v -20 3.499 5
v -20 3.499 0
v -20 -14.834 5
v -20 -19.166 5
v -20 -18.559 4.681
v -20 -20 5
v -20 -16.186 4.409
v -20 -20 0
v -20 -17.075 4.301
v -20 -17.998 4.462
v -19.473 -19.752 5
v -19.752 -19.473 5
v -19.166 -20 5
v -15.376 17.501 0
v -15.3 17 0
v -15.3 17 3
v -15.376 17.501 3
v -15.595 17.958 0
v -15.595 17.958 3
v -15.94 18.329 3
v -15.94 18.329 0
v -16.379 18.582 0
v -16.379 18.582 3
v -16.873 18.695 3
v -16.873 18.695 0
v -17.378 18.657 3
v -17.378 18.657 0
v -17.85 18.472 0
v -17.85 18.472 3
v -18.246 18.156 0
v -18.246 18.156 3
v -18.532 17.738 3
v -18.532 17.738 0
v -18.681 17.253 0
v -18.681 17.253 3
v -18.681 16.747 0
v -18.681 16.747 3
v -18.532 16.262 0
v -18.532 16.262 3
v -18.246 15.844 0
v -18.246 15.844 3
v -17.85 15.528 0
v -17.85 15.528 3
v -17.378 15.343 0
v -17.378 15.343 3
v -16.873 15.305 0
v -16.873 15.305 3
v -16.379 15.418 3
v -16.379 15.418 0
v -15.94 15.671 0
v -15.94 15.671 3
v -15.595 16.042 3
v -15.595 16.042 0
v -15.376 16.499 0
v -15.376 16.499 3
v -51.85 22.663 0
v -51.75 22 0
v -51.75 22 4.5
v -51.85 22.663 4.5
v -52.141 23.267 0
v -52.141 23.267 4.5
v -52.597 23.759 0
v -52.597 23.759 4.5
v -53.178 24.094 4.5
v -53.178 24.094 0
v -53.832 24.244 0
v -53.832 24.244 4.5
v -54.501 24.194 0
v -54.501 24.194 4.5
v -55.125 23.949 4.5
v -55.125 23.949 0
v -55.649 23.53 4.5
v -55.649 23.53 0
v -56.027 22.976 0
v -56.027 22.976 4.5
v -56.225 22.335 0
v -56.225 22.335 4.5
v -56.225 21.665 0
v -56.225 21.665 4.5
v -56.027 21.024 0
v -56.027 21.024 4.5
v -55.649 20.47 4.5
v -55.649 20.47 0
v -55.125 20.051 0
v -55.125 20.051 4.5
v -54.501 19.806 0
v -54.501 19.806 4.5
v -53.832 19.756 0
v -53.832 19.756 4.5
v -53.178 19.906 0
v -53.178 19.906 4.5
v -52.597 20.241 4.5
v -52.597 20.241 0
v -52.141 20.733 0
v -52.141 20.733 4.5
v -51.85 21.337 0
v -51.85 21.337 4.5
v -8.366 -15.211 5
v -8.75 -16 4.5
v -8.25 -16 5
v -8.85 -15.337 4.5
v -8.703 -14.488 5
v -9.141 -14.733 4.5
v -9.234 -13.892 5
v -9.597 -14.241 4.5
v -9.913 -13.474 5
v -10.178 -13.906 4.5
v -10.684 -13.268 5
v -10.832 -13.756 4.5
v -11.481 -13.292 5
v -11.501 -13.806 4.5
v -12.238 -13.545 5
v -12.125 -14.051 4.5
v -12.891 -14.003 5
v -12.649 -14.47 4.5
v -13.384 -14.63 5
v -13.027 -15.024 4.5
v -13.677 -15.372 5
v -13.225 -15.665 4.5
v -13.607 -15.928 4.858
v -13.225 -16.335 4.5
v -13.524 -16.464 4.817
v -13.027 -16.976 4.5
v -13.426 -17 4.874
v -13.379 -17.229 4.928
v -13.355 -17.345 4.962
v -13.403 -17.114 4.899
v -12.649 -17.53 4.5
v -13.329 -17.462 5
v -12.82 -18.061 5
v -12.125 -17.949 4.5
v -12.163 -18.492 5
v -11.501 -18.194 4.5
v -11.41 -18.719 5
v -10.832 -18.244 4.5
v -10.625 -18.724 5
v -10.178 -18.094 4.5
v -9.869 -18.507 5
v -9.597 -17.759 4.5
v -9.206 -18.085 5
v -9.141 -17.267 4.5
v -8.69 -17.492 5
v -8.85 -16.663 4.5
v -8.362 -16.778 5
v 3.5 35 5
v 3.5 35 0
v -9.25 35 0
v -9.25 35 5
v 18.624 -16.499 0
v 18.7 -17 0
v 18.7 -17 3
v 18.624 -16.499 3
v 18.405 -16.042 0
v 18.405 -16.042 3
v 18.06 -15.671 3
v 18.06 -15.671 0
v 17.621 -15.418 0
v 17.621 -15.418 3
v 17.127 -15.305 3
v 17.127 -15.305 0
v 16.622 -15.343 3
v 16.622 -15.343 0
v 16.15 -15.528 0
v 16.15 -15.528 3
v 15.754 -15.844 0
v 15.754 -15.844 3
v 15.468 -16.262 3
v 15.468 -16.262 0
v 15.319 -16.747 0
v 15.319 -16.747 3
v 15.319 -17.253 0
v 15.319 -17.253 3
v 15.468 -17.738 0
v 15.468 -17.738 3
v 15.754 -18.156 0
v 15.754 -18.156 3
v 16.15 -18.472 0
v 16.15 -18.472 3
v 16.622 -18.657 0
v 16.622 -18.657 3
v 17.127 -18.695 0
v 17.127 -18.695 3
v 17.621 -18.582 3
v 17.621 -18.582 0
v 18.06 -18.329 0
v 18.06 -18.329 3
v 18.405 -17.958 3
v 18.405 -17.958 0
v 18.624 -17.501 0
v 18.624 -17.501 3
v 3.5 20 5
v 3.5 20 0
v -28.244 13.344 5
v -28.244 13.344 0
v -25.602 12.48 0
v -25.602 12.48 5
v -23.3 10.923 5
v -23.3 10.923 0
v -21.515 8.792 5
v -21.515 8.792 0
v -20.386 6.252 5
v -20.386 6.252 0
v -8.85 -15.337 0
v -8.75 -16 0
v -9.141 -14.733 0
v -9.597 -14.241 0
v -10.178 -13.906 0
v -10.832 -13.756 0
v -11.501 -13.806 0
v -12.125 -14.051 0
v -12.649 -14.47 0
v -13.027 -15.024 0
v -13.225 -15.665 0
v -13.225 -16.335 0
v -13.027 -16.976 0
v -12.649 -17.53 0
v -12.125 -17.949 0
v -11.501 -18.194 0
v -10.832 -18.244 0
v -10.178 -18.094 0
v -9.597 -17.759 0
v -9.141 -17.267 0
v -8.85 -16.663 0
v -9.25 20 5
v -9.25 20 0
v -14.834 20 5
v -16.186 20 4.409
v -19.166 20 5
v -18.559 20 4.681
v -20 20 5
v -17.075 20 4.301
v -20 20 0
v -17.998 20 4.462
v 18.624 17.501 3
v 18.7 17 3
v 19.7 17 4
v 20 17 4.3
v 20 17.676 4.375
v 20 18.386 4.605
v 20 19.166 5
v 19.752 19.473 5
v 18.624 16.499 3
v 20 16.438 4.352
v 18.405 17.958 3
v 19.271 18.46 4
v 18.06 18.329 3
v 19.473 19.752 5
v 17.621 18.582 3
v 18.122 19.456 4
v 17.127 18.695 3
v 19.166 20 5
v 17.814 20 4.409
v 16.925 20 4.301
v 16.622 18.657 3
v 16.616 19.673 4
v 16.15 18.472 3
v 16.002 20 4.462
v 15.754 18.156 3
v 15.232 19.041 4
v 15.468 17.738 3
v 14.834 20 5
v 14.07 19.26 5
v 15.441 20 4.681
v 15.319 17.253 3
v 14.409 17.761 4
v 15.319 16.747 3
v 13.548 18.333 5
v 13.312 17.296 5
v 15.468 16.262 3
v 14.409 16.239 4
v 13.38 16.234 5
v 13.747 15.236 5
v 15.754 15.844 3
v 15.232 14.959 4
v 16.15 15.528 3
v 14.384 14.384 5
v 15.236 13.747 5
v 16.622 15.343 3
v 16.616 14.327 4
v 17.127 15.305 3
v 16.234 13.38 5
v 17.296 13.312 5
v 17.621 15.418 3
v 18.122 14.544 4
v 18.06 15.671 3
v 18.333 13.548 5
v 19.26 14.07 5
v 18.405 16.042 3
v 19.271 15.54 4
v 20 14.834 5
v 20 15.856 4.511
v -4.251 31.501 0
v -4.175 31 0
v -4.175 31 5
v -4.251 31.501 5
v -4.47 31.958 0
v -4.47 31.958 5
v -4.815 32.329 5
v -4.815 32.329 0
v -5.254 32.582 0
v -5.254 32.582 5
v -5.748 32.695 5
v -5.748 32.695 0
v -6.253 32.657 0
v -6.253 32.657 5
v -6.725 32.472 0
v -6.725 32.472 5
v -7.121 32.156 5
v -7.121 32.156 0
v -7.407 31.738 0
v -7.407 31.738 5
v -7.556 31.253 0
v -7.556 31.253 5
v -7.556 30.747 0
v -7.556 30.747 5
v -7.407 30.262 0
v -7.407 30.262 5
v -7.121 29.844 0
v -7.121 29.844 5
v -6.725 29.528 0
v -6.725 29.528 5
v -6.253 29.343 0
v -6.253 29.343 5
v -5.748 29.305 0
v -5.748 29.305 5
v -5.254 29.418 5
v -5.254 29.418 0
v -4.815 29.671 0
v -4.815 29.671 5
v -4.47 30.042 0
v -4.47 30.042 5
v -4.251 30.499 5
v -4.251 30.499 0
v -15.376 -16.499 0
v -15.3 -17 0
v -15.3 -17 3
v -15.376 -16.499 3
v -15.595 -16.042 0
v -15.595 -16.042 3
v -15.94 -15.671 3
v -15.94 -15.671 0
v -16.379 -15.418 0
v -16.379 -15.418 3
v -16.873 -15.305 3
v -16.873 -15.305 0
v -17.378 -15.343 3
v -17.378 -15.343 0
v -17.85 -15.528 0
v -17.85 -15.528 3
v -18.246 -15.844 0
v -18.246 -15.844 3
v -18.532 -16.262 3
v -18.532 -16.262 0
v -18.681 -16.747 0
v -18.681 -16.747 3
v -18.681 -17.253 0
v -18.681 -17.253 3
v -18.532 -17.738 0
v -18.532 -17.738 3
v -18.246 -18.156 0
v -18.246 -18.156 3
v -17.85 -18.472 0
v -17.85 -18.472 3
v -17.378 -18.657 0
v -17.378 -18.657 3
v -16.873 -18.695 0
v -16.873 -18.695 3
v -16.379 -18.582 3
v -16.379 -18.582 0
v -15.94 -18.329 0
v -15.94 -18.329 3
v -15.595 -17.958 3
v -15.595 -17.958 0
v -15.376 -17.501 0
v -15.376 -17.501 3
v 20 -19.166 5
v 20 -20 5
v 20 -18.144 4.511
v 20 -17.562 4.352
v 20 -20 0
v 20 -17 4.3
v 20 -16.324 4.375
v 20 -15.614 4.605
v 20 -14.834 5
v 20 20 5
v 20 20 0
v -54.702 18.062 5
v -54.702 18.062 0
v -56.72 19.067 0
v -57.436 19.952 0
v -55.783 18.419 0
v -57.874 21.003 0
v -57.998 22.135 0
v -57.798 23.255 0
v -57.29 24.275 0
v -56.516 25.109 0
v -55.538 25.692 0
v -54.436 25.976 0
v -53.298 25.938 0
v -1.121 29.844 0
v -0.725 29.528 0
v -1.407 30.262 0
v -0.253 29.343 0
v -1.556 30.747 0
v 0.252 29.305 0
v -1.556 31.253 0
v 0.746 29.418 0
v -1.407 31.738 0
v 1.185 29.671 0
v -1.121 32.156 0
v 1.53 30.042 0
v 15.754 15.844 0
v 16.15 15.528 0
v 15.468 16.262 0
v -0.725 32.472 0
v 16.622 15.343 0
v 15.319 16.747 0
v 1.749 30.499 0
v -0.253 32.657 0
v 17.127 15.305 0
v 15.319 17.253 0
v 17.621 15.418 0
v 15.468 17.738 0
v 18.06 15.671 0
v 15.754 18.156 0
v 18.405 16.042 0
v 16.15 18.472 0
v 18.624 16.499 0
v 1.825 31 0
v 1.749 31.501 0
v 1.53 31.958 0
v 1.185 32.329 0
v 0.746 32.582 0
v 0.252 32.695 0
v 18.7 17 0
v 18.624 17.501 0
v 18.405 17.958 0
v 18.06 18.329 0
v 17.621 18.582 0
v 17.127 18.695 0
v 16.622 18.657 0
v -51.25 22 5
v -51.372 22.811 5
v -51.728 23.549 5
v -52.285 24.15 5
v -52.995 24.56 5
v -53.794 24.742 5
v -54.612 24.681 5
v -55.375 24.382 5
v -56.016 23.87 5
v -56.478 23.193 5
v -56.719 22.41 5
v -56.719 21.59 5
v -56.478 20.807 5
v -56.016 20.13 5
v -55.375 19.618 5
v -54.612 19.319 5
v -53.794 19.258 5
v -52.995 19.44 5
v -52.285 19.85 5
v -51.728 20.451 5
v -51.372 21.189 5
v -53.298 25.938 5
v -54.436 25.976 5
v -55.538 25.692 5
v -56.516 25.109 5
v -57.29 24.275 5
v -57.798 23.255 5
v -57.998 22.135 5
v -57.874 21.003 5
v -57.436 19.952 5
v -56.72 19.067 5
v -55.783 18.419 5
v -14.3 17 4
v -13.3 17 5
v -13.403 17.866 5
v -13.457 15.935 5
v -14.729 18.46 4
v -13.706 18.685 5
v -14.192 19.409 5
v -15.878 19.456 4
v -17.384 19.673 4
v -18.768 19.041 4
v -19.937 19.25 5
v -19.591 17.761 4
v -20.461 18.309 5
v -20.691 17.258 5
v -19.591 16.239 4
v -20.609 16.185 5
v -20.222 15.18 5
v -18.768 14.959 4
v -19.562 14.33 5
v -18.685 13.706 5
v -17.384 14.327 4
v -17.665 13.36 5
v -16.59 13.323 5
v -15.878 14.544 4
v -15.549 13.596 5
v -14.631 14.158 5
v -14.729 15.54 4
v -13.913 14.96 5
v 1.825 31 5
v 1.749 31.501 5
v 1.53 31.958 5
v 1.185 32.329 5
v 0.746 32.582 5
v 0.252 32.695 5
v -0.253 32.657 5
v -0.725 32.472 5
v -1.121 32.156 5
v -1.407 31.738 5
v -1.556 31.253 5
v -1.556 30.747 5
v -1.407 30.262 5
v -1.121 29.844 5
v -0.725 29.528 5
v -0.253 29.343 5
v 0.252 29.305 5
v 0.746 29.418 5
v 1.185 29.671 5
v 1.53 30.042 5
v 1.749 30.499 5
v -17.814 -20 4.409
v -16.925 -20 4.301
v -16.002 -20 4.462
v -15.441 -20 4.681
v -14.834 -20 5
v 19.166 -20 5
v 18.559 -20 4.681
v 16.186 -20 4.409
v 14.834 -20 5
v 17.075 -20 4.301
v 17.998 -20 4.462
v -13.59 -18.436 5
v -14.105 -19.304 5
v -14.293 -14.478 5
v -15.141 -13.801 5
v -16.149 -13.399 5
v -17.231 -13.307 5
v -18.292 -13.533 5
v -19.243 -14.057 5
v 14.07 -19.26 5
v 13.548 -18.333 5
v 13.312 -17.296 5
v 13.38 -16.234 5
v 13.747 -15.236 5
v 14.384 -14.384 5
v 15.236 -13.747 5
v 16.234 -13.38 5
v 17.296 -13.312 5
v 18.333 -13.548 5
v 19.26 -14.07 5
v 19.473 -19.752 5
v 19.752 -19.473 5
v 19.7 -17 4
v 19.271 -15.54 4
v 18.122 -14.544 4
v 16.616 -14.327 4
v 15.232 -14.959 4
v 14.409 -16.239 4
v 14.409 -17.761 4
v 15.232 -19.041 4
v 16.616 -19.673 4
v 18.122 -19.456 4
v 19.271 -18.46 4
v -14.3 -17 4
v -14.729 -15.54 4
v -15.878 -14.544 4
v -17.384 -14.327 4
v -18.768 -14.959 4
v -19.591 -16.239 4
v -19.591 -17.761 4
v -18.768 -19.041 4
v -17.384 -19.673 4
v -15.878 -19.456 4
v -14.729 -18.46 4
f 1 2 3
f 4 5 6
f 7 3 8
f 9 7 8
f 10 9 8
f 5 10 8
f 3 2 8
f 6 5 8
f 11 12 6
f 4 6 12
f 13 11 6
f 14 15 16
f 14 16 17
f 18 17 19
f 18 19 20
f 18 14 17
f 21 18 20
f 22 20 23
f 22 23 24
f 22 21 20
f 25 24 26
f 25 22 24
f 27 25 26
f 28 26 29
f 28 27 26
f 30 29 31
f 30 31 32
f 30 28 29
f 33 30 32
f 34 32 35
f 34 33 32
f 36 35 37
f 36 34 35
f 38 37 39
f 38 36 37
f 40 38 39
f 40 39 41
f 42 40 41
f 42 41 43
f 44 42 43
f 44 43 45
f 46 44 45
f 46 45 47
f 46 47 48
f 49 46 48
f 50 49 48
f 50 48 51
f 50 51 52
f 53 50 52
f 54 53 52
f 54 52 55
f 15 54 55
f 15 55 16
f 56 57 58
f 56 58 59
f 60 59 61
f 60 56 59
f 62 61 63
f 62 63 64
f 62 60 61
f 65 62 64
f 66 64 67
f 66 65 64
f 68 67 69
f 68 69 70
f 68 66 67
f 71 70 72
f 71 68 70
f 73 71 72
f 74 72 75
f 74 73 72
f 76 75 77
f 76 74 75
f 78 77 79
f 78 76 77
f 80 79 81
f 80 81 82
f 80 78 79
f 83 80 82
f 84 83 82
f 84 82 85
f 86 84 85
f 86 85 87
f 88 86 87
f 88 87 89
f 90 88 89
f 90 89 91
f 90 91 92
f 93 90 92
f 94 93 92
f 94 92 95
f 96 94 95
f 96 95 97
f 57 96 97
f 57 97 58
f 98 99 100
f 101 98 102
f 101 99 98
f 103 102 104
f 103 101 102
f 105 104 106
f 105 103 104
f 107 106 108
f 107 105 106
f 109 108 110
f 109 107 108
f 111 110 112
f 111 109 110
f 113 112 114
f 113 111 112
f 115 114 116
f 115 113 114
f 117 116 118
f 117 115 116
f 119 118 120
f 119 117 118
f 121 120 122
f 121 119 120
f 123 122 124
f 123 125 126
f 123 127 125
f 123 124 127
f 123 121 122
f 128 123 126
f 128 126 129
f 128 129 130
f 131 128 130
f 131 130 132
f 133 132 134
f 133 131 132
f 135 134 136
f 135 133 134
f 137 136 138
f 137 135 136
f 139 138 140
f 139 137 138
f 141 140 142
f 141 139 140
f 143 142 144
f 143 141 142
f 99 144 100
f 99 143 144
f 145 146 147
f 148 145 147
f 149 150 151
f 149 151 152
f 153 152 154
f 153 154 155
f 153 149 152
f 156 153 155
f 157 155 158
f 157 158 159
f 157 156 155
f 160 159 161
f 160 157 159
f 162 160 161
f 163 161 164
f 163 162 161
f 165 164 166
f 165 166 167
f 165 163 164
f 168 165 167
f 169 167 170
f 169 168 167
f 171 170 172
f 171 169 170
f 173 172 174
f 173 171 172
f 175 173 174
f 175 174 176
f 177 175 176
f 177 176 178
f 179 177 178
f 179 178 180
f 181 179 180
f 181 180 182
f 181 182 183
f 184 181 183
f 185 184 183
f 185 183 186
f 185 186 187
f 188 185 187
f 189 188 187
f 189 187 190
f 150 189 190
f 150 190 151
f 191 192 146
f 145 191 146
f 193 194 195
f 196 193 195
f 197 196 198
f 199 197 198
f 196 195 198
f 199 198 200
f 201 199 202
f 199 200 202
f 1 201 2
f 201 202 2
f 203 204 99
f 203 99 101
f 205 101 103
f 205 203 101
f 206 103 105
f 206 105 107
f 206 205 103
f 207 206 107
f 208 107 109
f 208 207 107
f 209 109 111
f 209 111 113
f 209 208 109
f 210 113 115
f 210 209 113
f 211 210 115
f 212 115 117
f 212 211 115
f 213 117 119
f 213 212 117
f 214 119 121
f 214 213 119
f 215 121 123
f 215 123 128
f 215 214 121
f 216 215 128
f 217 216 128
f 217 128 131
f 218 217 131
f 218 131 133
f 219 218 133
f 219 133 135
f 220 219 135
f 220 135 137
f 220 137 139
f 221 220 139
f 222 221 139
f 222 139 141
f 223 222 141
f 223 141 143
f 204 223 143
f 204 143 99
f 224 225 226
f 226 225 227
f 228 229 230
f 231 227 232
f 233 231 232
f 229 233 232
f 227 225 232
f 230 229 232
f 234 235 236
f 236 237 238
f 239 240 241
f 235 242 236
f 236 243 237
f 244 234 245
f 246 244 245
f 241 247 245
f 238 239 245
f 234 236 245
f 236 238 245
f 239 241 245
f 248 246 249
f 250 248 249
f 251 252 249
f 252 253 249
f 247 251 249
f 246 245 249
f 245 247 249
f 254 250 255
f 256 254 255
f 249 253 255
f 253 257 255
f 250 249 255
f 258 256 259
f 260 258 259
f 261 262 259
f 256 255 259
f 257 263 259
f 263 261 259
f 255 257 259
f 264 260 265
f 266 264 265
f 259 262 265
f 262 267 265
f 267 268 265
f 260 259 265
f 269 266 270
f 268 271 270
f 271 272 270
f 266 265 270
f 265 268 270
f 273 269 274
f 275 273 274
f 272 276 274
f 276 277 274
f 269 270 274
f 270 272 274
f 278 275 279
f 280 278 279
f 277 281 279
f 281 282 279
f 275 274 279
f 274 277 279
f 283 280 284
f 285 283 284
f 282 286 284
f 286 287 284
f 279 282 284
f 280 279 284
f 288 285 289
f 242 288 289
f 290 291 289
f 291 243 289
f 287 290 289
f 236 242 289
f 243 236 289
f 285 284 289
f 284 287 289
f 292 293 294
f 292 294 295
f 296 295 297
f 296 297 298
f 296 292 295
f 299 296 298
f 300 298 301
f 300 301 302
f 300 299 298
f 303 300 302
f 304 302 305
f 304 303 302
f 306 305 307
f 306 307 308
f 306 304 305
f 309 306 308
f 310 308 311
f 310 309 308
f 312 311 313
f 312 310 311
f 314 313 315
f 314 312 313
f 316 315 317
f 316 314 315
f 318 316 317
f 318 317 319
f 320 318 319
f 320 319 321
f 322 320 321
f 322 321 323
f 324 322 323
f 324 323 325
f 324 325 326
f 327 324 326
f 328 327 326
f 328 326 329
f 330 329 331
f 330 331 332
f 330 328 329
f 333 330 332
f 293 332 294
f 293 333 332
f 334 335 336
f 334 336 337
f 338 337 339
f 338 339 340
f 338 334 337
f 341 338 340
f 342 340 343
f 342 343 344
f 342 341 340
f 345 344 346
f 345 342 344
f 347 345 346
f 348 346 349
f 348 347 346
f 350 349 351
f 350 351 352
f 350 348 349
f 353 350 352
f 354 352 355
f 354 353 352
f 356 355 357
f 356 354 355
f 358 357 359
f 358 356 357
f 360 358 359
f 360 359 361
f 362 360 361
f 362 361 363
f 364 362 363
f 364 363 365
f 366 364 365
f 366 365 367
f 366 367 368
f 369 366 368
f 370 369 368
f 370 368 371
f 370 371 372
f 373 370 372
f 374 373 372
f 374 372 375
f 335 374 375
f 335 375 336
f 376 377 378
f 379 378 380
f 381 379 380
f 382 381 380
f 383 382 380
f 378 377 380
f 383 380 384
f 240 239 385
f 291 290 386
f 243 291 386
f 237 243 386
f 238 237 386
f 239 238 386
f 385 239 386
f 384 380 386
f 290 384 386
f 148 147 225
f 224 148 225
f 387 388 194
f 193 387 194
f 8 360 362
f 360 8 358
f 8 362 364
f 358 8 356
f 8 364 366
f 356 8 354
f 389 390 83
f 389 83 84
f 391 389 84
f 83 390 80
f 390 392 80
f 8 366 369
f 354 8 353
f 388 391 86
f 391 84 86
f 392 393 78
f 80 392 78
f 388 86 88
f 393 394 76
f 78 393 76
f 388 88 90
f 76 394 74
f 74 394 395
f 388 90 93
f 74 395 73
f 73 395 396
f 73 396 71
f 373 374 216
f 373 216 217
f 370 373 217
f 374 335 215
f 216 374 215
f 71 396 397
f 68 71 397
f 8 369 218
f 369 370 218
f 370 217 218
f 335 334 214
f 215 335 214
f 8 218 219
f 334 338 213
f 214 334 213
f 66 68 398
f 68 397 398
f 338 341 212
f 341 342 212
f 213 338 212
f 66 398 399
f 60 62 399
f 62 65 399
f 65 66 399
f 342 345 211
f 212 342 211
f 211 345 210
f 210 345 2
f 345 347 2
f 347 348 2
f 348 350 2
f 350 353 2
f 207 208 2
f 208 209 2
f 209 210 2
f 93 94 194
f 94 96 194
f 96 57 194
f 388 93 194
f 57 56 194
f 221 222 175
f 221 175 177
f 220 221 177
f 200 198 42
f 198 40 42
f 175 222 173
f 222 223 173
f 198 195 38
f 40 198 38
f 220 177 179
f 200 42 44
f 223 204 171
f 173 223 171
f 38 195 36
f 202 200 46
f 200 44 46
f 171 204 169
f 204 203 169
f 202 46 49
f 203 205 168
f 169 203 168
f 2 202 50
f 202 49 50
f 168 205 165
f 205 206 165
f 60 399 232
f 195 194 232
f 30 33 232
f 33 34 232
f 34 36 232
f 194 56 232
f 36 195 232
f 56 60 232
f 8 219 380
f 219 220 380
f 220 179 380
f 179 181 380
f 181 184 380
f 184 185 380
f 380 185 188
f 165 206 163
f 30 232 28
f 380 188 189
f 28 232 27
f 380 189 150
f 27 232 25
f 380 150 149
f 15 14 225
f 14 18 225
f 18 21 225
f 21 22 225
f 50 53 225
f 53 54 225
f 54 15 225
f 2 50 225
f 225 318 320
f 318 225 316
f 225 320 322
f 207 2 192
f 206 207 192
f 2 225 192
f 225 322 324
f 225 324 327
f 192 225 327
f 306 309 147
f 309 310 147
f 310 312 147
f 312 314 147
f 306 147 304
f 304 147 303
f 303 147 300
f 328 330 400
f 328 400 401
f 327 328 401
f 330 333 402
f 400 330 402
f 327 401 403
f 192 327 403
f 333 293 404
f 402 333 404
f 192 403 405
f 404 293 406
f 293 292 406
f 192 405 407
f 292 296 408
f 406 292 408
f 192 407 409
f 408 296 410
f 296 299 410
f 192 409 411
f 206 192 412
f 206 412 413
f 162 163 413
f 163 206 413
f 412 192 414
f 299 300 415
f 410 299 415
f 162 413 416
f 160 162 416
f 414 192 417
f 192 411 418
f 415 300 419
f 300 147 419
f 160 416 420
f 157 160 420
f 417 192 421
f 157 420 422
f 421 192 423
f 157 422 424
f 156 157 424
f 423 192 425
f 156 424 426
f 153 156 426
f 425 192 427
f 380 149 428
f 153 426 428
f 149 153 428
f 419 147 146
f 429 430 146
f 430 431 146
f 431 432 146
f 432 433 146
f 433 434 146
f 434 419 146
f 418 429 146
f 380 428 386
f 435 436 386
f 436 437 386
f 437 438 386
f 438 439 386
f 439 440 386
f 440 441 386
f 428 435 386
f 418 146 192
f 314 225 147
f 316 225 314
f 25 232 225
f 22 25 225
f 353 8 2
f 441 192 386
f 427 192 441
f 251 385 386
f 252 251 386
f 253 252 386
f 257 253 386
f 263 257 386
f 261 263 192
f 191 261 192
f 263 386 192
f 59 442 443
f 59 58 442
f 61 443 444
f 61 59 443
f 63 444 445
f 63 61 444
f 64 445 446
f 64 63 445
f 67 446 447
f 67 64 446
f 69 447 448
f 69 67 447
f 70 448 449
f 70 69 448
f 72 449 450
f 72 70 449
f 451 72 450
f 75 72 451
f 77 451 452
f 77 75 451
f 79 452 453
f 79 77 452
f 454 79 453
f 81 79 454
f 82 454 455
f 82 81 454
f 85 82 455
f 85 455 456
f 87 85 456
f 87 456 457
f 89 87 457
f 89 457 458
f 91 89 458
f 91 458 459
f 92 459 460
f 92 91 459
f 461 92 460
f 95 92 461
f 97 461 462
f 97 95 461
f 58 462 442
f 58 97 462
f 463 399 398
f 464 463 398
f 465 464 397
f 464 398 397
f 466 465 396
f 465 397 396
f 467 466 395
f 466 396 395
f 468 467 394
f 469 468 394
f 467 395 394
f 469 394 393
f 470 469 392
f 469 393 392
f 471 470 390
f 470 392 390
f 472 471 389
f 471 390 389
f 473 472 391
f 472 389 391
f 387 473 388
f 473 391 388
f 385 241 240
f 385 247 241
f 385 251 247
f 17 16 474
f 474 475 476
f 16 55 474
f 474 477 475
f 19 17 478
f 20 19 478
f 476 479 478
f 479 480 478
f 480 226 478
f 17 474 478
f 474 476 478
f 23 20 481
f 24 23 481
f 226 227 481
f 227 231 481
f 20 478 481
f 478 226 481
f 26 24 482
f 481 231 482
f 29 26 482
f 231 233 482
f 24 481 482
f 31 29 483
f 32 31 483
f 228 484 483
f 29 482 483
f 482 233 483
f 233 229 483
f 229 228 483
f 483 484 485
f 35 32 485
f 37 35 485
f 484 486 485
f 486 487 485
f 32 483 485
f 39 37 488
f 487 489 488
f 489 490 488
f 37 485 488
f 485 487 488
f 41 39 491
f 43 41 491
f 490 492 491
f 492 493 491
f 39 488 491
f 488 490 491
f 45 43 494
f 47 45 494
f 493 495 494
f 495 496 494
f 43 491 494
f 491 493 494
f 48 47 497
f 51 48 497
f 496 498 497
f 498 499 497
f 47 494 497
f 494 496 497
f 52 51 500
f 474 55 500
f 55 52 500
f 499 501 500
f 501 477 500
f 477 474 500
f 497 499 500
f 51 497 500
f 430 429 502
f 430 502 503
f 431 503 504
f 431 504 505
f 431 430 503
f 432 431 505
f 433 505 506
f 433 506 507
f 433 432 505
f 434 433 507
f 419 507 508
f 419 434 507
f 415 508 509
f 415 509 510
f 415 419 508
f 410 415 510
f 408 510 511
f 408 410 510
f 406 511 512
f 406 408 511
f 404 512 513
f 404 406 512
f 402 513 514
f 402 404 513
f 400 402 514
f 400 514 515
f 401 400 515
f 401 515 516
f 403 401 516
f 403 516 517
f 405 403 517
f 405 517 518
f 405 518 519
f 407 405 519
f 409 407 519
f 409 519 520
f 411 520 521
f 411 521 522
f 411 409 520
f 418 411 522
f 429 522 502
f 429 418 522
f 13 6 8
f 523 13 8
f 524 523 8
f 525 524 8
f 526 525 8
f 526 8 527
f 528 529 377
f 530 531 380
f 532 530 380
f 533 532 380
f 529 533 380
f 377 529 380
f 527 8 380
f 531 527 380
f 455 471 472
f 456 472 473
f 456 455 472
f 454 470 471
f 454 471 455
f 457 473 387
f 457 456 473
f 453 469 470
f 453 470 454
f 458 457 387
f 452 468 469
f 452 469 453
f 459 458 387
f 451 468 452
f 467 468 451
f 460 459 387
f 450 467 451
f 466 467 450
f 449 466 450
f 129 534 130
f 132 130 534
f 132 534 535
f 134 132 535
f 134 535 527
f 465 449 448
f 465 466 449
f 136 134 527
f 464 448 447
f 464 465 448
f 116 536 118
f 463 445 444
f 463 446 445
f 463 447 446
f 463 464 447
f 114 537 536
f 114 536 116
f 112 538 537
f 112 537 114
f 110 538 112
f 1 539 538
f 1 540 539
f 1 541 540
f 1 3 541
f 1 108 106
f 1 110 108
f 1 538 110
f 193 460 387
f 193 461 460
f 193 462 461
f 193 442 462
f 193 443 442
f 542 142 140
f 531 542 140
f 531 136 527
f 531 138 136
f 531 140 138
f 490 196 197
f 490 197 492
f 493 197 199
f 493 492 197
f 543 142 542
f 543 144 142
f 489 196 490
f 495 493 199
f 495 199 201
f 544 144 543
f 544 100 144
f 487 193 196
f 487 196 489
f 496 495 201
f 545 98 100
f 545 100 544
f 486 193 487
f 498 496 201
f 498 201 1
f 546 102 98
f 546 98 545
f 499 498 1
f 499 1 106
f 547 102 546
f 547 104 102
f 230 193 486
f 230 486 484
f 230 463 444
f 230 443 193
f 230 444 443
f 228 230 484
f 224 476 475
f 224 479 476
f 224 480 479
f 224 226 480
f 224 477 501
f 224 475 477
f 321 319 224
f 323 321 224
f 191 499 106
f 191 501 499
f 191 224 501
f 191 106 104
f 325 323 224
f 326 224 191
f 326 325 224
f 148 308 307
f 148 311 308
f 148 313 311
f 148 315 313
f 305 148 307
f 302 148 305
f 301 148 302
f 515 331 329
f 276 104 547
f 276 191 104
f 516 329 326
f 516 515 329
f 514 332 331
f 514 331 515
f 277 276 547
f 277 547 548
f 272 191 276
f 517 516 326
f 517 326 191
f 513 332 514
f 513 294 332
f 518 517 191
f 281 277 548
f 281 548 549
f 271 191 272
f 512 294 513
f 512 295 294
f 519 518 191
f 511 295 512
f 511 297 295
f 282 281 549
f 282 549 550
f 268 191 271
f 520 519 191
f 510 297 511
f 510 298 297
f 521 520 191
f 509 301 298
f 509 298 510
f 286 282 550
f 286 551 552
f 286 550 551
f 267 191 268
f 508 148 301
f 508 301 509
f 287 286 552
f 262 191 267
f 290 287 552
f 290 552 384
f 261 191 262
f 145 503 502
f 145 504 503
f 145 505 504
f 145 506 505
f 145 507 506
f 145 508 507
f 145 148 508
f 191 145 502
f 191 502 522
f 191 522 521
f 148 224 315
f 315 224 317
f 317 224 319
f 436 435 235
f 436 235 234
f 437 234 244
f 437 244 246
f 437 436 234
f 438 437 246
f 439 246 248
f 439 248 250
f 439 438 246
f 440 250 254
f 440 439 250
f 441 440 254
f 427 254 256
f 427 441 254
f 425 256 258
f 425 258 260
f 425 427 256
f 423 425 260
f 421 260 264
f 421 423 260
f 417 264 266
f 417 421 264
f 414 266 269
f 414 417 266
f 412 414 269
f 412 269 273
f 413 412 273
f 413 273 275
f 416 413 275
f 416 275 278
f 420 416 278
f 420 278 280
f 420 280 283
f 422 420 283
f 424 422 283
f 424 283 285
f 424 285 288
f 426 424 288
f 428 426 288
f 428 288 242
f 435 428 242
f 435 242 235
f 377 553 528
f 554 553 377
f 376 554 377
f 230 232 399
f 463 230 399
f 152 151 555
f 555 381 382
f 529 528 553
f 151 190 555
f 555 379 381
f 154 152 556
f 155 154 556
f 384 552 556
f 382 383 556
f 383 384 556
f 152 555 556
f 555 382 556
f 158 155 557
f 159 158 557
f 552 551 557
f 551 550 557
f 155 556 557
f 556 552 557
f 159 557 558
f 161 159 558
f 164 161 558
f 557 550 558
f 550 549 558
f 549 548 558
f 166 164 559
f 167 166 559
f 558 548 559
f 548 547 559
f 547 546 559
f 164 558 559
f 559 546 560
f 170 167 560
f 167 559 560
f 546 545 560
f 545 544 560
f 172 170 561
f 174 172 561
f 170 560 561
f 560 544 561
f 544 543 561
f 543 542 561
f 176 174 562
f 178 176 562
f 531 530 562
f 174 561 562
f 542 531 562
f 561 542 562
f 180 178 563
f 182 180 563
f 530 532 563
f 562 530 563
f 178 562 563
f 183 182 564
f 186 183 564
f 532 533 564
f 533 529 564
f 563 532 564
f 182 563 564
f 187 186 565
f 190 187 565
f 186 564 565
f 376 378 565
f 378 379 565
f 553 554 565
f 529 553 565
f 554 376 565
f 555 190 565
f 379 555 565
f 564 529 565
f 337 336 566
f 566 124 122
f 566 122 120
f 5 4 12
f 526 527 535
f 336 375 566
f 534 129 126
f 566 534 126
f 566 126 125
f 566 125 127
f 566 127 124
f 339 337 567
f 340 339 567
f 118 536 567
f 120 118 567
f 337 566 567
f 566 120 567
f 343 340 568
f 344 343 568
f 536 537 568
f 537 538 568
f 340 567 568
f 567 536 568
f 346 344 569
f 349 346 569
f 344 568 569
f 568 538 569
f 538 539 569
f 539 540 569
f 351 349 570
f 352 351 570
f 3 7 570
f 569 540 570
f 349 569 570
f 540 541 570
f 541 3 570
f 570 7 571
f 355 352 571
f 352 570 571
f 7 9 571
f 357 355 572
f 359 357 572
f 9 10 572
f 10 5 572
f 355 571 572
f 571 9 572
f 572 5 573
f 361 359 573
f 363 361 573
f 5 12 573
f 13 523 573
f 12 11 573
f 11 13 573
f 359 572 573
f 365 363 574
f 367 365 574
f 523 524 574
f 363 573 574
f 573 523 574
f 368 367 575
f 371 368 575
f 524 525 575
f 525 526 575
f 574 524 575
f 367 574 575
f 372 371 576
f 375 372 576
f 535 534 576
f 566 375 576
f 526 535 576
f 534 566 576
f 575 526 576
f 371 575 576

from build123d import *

# Parameters (mm, degrees)
SKETCH1_R           = 1.7
SKETCH1_R_2         = 2.25
BOSS_EXTRUDE1_DEPTH = 5
CHAMFER1_SIZE       = 2
CHAMFER2_SIZE       = 0.5


with BuildPart() as part:
    # Sketch1 → Boss-Extrude1 (new body)
    with BuildSketch(Plane.XY):
        with BuildLine():
            Line((3.5, 20), (3.5, 35))
            Line((3.5, 35), (-9.25, 35))
            Line((-9.25, 35), (-9.25, 20))
            Line((-9.25, 20), (-20, 20))
            Line((-20, 20), (-53.297771938, 25.937877061))
            ThreePointArc((-53.297771938, 25.937877061), (-57.937877061, 22.702228062), (-54.702228062, 18.062122939))
            Line((-54.702228062, 18.062122939), (-28.244429844, 13.343994848))
            ThreePointArc((-28.244429844, 13.343994848), (-22.333328572, 9.919749939), (-20, 3.499302196))
            Line((-20, 3.499302196), (-20, -20))
            Line((-20, -20), (20, -20))
            Line((20, -20), (20, 20))
            Line((20, 20), (3.5, 20))
        make_face()
        with Locations((-17, 17)):
            Circle(SKETCH1_R, mode=Mode.SUBTRACT)
        with Locations((17, 17)):
            Circle(SKETCH1_R, mode=Mode.SUBTRACT)
        with Locations((17, -17)):
            Circle(SKETCH1_R, mode=Mode.SUBTRACT)
        with Locations((-17, -17)):
            Circle(SKETCH1_R, mode=Mode.SUBTRACT)
        with Locations((-5.875, 31)):
            Circle(SKETCH1_R, mode=Mode.SUBTRACT)
        with Locations((0.125, 31)):
            Circle(SKETCH1_R, mode=Mode.SUBTRACT)
        with Locations((-11, -16)):
            Circle(SKETCH1_R_2, mode=Mode.SUBTRACT)
        with Locations((-54, 22)):
            Circle(SKETCH1_R_2, mode=Mode.SUBTRACT)
    extrude(amount=BOSS_EXTRUDE1_DEPTH)

    # Chamfer1
    # the kernel refuses this chamfer: 2 mm, written as the material it takes off along each edge
    with BuildSketch(Plane(origin=(-17, 17, 5), x_dir=(1, 0, 0), z_dir=(0, -1, 0))) as chamfer1_piece_1:
        Polygon((1.7, -CHAMFER1_SIZE), (1.7 + CHAMFER1_SIZE, 0), (1.7, 0), align=None)
    revolve(axis=Axis((-17, 17, 5), (0, 0, 1)), mode=Mode.SUBTRACT)
    with BuildSketch(Plane(origin=(17, 17, 5), x_dir=(1, 0, 0), z_dir=(0, -1, 0))) as chamfer1_piece_2:
        Polygon((1.7, -CHAMFER1_SIZE), (1.7 + CHAMFER1_SIZE, 0), (1.7, 0), align=None)
    revolve(axis=Axis((17, 17, 5), (0, 0, 1)), mode=Mode.SUBTRACT)
    with BuildSketch(Plane(origin=(17, -17, 5), x_dir=(1, 0, 0), z_dir=(0, -1, 0))) as chamfer1_piece_3:
        Polygon((1.7, -CHAMFER1_SIZE), (1.7 + CHAMFER1_SIZE, 0), (1.7, 0), align=None)
    revolve(axis=Axis((17, -17, 5), (0, 0, 1)), mode=Mode.SUBTRACT)
    with BuildSketch(Plane(origin=(-17, -17, 5), x_dir=(1, 0, 0), z_dir=(0, -1, 0))) as chamfer1_piece_4:
        Polygon((1.7, -CHAMFER1_SIZE), (1.7 + CHAMFER1_SIZE, 0), (1.7, 0), align=None)
    revolve(axis=Axis((-17, -17, 5), (0, 0, 1)), mode=Mode.SUBTRACT)

    # Chamfer2
    # the kernel refuses this chamfer: 0.5 mm, written as the material it takes off along each edge
    with BuildSketch(Plane(origin=(-11, -16, 5), x_dir=(1, 0, 0), z_dir=(0, -1, 0))) as chamfer2_piece_1:
        Polygon((2.25 + CHAMFER2_SIZE, 0), (2.25, -CHAMFER2_SIZE), (2.25, 0), align=None)
    revolve(axis=Axis((-11, -16, 5), (0, 0, 1)), mode=Mode.SUBTRACT)
    with BuildSketch(Plane(origin=(-54, 22, 5), x_dir=(1, 0, 0), z_dir=(0, -1, 0))) as chamfer2_piece_2:
        Polygon((2.25 + CHAMFER2_SIZE, 0), (2.25, -CHAMFER2_SIZE), (2.25, 0), align=None)
    revolve(axis=Axis((-54, 22, 5), (0, 0, 1)), mode=Mode.SUBTRACT)


solid = part.part
